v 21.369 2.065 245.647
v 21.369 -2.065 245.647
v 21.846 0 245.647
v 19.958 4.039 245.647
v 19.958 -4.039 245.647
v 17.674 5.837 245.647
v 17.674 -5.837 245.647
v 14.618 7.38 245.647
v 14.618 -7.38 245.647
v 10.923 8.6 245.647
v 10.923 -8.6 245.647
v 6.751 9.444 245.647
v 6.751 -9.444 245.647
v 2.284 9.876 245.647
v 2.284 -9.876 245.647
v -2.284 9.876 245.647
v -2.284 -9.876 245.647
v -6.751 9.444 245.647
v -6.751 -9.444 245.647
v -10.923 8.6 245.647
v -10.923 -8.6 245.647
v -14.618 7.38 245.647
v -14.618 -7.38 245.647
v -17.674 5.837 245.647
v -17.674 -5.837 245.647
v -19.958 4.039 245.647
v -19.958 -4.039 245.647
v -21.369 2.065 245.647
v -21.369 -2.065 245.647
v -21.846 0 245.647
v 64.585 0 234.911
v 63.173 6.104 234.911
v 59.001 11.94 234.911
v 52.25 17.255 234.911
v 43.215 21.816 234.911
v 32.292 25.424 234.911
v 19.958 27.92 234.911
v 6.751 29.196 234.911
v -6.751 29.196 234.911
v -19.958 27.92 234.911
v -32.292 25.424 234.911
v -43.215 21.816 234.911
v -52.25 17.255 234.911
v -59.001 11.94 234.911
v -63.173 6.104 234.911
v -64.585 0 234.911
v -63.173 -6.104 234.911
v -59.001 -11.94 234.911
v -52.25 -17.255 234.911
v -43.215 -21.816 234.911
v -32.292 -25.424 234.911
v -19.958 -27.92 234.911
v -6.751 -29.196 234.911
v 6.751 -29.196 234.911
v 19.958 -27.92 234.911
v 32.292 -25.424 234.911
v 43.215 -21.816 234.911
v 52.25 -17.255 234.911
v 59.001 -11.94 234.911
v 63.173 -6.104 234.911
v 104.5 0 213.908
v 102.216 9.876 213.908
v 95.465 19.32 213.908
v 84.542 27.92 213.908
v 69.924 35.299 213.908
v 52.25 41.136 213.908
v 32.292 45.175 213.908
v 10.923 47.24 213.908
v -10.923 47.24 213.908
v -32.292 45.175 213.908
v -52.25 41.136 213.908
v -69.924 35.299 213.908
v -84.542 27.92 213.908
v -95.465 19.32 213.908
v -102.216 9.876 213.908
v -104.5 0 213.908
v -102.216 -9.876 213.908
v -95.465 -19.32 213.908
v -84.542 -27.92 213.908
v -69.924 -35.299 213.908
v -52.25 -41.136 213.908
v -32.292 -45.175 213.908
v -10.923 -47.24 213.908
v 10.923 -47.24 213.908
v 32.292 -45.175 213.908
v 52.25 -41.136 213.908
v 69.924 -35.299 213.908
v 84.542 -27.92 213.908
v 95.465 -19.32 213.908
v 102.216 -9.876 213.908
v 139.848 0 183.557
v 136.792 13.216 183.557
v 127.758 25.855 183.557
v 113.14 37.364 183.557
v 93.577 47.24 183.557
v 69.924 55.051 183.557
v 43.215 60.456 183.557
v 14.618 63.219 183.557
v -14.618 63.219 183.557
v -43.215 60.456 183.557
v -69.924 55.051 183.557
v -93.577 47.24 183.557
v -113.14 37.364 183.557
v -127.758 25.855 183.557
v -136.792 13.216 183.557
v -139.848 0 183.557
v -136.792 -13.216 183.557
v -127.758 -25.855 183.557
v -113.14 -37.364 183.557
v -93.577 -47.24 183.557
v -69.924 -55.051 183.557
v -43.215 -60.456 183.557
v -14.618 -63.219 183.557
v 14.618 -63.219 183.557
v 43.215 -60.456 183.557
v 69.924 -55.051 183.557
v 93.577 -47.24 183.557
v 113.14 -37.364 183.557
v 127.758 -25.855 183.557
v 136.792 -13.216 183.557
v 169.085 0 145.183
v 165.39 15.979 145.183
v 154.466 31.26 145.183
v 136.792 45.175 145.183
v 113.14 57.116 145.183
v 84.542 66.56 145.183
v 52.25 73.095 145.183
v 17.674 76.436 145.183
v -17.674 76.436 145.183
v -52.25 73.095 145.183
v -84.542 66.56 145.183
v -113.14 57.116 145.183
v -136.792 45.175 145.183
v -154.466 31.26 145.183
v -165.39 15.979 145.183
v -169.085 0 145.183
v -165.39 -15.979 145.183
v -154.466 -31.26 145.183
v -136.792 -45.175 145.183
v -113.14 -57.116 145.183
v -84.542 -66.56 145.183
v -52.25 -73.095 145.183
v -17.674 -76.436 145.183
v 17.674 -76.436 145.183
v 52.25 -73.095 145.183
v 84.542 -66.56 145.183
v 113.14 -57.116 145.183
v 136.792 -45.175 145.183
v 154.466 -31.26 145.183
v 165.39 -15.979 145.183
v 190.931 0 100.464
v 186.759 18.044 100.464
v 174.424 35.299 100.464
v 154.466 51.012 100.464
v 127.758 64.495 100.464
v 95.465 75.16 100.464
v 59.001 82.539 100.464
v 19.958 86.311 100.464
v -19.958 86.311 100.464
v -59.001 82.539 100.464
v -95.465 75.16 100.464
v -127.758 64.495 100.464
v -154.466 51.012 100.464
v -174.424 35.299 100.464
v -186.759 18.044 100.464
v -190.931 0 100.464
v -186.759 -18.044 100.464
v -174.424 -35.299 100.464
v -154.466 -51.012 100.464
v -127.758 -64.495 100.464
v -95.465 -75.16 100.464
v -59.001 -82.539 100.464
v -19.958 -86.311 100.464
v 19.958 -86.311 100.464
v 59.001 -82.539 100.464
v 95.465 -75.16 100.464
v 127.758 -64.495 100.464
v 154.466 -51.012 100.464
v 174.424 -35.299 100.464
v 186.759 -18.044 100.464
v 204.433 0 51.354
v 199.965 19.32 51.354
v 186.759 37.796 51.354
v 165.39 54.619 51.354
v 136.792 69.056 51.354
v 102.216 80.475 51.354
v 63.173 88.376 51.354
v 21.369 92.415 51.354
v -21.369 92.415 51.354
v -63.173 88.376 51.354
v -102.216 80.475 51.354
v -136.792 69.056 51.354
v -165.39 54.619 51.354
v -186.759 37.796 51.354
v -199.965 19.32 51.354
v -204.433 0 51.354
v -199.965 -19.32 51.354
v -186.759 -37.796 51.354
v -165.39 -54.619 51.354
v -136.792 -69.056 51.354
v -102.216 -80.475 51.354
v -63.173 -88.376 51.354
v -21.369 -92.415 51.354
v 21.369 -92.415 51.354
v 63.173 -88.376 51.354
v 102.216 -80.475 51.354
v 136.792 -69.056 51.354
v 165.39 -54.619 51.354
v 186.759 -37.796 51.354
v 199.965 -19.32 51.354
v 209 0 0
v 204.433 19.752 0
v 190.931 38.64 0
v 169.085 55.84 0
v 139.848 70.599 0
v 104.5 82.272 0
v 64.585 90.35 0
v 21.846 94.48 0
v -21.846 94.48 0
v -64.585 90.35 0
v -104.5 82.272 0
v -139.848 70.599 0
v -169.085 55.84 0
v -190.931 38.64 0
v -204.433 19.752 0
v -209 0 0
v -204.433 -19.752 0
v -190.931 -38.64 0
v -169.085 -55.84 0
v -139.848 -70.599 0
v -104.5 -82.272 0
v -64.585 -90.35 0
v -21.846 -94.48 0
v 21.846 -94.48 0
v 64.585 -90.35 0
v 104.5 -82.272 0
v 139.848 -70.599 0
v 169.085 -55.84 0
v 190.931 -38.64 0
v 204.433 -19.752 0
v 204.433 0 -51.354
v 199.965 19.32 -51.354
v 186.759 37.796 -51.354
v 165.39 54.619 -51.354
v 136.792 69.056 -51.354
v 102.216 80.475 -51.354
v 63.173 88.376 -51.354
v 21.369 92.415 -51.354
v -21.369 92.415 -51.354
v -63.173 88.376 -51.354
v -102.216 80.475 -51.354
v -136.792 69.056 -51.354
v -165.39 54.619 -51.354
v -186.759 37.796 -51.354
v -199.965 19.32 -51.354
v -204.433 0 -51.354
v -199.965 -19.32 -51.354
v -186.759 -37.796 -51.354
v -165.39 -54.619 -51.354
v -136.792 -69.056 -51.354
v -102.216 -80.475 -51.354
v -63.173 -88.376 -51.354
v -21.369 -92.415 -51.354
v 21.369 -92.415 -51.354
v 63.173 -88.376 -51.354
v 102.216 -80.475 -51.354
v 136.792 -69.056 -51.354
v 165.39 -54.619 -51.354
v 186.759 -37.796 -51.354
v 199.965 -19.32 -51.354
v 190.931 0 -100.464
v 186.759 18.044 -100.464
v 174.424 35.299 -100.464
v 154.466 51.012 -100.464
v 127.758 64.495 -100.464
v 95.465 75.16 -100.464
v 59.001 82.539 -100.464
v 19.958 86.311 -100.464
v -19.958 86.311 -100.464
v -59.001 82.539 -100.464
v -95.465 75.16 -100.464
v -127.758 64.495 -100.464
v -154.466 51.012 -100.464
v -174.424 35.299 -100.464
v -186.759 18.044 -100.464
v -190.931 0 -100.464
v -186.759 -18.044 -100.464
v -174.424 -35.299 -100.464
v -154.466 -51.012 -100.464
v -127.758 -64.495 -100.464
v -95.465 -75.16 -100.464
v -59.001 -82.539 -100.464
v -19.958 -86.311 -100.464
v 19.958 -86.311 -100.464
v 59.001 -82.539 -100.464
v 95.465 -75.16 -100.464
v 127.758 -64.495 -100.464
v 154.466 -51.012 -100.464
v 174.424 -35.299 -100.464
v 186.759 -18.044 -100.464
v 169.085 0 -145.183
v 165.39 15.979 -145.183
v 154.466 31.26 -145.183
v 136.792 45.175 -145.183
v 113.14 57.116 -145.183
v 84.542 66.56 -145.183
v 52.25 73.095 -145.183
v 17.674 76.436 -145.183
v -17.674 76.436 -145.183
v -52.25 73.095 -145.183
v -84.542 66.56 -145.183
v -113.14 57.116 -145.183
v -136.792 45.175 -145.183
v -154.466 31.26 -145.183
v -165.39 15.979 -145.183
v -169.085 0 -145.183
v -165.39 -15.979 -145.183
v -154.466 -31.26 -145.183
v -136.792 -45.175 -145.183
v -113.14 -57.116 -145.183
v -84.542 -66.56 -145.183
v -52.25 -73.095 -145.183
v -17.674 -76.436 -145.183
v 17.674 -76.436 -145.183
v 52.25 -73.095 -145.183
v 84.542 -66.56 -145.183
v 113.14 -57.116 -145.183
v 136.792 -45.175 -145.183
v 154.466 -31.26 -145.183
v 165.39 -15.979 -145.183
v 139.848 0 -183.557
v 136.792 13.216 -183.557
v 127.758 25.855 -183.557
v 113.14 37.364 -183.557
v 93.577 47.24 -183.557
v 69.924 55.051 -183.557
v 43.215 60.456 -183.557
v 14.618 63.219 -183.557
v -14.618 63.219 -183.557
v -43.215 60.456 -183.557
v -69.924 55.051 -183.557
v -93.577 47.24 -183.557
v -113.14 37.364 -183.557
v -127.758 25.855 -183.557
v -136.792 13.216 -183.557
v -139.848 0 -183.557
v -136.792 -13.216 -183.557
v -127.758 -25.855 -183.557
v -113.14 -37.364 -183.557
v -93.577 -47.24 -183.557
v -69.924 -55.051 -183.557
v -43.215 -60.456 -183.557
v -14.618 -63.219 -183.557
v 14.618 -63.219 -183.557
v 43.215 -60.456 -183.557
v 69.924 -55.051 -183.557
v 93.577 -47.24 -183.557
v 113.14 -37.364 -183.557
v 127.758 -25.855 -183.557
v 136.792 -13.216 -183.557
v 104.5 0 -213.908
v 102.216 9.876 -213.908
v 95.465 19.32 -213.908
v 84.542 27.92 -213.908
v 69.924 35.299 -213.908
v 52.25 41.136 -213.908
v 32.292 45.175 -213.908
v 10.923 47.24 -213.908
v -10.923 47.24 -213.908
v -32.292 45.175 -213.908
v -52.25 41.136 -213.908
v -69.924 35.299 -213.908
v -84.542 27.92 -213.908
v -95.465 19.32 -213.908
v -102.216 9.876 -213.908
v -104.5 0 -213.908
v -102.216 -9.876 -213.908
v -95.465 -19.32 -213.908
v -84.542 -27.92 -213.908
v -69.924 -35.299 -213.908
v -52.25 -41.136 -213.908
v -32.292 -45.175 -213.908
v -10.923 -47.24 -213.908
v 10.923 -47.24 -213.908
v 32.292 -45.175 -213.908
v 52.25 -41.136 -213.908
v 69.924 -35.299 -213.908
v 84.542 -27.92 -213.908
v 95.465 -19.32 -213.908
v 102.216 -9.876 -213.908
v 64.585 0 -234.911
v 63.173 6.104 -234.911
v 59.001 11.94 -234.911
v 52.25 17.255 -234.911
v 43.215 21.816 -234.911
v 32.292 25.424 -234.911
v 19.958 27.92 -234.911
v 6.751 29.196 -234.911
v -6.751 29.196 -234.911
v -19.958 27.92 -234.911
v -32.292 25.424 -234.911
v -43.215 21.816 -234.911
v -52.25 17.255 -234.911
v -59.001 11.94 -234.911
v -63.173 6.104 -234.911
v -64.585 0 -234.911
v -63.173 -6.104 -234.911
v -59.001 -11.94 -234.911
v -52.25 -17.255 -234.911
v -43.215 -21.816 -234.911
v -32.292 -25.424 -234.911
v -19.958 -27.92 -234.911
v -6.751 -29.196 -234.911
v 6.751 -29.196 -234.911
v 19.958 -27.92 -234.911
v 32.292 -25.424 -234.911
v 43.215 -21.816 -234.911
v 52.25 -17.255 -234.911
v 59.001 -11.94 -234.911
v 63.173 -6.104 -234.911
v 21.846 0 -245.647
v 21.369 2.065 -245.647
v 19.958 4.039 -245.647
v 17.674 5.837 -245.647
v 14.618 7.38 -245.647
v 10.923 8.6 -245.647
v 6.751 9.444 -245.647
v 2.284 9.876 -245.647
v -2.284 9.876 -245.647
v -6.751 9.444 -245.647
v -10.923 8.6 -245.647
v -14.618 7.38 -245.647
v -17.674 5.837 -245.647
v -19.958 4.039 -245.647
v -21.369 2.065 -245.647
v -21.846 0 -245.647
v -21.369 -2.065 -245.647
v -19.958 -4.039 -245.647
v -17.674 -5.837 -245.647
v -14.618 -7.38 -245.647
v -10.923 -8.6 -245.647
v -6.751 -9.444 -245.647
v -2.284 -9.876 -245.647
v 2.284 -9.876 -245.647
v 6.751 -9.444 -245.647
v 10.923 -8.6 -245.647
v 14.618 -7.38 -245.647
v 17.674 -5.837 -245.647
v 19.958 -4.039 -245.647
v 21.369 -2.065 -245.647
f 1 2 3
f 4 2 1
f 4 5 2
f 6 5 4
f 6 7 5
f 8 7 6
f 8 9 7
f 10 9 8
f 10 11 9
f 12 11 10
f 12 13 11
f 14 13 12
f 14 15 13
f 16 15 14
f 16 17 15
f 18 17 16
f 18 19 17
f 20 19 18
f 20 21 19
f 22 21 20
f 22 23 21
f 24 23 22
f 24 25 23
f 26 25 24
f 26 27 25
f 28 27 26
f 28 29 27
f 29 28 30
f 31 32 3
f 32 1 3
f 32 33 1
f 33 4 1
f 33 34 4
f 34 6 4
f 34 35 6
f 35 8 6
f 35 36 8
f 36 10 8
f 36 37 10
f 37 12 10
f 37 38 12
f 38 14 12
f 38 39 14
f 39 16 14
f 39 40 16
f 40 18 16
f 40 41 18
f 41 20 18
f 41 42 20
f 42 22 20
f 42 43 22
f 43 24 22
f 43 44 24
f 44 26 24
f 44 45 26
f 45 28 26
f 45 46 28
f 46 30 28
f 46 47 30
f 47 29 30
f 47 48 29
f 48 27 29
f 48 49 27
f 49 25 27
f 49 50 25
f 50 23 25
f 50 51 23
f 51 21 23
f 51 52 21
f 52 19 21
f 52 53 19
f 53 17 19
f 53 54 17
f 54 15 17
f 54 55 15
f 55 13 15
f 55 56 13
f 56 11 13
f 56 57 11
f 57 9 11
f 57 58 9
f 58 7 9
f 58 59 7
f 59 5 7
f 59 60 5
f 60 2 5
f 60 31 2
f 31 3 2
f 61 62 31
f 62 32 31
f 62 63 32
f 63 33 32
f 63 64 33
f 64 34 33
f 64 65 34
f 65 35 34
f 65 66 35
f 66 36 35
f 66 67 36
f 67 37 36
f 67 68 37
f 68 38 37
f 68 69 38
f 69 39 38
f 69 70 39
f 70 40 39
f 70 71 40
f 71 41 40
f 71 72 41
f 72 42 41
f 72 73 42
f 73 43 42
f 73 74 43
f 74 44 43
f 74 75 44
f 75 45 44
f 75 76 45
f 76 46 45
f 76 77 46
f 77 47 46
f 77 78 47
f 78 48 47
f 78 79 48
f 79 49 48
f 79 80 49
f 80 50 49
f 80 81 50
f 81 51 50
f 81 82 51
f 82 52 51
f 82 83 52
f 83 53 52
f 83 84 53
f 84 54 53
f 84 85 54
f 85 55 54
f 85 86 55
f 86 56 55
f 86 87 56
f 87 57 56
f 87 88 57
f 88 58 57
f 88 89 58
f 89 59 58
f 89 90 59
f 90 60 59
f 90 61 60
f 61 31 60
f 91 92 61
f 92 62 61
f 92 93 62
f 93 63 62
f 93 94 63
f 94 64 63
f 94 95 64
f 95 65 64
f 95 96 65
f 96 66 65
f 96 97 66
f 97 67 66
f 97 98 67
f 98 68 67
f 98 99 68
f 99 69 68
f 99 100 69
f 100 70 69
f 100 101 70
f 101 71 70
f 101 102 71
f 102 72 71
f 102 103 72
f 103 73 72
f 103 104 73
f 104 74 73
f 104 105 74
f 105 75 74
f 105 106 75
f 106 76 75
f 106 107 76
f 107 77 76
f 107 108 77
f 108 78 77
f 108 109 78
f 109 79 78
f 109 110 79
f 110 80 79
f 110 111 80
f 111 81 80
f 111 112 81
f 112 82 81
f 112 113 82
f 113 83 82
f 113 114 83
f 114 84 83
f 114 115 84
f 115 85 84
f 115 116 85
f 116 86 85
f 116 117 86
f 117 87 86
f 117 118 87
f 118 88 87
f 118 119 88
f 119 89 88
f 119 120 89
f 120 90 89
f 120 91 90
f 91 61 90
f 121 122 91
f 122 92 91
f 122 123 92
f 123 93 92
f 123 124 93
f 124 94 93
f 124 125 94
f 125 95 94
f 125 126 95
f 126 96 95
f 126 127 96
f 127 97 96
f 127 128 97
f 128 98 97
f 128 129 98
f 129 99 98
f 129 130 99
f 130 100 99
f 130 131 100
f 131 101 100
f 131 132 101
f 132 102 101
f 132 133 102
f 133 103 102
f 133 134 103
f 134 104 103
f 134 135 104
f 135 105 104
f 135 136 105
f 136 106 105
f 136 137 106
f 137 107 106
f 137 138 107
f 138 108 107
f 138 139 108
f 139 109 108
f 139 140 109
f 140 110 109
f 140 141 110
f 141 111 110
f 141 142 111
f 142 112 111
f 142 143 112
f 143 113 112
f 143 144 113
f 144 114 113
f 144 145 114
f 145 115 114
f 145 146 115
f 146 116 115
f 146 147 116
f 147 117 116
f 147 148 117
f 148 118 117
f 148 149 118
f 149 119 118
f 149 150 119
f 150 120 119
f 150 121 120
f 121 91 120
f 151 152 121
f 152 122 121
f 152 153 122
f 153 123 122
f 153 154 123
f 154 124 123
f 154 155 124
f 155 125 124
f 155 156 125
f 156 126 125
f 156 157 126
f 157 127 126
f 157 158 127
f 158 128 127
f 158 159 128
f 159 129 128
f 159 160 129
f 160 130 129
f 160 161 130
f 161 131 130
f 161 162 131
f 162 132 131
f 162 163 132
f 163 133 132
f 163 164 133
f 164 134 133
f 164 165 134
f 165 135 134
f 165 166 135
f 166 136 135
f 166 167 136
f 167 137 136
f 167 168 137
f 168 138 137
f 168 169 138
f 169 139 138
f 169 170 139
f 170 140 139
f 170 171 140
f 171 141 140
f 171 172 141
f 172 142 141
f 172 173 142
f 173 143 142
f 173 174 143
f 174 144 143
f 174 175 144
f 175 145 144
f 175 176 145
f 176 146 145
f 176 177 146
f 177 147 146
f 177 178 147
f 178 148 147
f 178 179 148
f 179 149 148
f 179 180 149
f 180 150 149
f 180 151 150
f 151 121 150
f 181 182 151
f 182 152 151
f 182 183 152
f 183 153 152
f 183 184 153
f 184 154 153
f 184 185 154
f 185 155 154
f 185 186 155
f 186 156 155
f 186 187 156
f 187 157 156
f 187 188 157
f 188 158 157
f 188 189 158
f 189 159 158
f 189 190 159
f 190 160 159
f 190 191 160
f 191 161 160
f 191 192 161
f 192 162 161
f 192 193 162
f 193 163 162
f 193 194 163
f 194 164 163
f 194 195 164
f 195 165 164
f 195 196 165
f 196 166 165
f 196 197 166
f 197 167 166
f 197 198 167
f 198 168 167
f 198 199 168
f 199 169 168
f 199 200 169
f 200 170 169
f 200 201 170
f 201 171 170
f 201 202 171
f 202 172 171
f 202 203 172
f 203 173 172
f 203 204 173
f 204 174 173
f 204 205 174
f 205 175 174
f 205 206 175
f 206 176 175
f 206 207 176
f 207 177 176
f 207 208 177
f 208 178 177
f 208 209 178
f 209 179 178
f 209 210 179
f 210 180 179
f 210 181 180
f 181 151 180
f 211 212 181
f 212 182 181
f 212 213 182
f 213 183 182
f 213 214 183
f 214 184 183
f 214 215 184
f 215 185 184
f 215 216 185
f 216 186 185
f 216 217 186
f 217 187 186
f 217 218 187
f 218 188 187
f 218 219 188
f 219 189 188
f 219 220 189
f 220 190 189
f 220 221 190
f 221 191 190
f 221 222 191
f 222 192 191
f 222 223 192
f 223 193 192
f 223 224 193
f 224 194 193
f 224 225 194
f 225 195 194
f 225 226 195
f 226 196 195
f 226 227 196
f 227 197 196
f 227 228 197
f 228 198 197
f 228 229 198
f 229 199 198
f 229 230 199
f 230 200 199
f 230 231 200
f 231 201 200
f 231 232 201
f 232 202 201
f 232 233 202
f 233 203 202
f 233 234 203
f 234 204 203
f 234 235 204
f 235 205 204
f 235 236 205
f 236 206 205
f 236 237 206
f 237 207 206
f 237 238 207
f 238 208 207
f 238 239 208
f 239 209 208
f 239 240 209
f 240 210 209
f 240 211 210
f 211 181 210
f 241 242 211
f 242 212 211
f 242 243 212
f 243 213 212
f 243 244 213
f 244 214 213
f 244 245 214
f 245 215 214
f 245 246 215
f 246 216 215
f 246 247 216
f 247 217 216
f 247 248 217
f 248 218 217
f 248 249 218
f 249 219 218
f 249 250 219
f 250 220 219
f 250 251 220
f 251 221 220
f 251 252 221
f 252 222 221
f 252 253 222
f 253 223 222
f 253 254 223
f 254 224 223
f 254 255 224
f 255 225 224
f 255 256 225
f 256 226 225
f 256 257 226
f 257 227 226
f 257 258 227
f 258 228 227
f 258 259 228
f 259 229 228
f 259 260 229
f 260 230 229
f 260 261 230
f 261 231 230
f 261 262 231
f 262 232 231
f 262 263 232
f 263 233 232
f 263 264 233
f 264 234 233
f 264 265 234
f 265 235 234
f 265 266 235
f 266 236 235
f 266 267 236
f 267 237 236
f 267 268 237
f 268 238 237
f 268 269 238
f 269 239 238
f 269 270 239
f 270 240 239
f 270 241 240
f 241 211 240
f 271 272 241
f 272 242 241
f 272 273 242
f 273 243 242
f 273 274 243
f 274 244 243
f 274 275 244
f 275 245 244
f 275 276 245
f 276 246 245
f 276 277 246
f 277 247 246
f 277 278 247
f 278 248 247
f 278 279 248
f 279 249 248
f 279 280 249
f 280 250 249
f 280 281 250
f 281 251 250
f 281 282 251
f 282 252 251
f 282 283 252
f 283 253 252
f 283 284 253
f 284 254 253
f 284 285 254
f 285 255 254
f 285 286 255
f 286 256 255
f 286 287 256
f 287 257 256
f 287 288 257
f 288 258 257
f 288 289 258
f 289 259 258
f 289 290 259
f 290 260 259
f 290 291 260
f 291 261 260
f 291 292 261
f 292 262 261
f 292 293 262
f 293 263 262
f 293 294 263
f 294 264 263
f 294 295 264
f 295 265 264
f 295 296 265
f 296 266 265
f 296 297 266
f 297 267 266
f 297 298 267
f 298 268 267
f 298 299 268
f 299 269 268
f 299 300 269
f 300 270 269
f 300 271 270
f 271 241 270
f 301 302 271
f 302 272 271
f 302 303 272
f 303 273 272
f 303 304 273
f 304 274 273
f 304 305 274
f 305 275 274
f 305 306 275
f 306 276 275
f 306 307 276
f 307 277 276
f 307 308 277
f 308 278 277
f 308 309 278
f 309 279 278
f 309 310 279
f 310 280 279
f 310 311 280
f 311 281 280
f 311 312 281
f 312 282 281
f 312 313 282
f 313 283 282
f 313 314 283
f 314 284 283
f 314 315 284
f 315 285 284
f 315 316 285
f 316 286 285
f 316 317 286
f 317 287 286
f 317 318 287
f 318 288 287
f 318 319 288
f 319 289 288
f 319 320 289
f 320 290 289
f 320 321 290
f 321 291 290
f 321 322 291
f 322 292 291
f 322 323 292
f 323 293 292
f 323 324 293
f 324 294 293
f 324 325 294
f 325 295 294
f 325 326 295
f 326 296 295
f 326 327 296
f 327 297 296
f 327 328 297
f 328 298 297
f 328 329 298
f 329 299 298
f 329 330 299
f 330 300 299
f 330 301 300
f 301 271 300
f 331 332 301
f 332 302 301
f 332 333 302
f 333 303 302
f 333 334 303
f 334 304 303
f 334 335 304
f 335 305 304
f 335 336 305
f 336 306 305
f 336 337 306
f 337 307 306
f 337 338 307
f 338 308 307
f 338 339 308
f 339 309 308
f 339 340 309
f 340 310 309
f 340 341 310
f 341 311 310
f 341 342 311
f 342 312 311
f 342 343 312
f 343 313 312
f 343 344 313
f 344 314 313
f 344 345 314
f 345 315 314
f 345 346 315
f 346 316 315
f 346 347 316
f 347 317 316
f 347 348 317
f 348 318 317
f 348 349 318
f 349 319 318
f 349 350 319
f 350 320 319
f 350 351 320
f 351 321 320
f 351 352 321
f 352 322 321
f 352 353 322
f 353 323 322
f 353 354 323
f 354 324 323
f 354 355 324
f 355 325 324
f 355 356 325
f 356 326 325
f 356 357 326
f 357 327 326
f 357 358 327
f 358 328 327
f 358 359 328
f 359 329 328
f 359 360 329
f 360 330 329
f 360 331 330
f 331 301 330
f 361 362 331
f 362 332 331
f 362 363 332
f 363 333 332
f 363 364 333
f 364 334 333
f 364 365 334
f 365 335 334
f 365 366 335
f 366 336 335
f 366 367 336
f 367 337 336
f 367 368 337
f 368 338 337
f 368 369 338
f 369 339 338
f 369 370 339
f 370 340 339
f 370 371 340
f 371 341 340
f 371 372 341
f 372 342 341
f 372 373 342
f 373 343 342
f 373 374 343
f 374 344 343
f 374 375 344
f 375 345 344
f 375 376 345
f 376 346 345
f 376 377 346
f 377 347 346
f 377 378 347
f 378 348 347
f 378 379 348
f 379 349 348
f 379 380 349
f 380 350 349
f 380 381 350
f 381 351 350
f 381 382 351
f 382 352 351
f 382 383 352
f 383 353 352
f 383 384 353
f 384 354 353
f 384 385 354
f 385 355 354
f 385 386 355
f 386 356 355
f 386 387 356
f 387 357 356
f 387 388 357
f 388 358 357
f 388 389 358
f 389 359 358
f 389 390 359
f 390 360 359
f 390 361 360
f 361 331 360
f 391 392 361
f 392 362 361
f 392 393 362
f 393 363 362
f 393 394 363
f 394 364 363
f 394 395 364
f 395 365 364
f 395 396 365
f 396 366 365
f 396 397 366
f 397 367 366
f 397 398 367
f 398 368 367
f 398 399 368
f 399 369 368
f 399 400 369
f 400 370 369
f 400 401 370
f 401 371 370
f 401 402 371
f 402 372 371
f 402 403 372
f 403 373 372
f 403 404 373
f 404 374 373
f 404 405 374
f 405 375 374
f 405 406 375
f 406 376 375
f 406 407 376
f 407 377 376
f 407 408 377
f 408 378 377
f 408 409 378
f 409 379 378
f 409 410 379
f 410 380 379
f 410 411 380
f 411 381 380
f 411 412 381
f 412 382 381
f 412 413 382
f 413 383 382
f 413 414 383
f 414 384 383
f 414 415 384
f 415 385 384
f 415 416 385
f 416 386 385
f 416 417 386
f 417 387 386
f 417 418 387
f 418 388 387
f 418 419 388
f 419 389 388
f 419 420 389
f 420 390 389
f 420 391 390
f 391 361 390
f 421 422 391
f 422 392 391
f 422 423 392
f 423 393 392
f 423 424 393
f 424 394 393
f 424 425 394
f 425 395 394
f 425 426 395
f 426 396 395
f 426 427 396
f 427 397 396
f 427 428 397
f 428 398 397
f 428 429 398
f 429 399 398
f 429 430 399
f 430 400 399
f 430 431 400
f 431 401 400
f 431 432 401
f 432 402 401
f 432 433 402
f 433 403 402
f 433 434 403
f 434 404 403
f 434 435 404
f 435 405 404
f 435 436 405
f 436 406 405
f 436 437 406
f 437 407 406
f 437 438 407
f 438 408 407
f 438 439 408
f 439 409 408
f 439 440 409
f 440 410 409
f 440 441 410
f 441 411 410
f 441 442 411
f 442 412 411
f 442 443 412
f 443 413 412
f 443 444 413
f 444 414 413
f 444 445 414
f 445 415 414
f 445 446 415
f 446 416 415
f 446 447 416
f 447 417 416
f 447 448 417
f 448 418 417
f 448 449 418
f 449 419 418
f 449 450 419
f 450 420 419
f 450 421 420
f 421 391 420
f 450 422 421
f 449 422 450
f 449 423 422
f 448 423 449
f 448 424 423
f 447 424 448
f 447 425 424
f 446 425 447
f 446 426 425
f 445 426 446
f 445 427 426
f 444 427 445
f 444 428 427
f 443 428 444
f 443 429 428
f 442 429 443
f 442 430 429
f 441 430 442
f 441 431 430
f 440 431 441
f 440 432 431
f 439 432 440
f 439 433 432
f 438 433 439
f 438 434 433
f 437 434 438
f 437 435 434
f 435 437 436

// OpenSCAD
// Generated by SolidPython 1.0.1 on 2020-07-29 00:46:49


scale(v = [11, 5, 13]) {
	sphere(r = 19);
}
/***********************************************
*********      SolidPython code:      **********
************************************************
 
# import packages: SolidPython
from solid import *
from solid.utils import *
from itertools import chain, combinations, permutations


class Resize:

    def __init__(self, scad_file):
        self.scad_file = scad_file
        #self.scad_file = import_scad(scad_file)
        # cone/cylinder param:
        self.r1 = 0
        self.r2 = 0
        self.h = 0
        # rectangular prism param:
        self.w = 0
        self.l = 0
        # ellipse param:
        self.r = 0

    # import OpenScad code (file name corresponds to shape)


    # classify shape + parameters
    def assign(self, param1, param2, param3):
        if self.scad_file == 'cone.scad':
            self.r1 = param1
            self.r2 = param2
            self.h = param3
        elif self.scad_file == 'cylinder.scad':
            self.r1 = param1
            self.r2 = param2
            self.h = param3
        elif self.scad_file == 'rectangularPrism.scad':
            self.h = param1
            self.l = param2
            self.w = param3
        else:
            self.r = param1
            self.h = param2

    # resize parameters
    def iterate(self):
        x = range(3, 20, 2)
        i = 1
        if self.scad_file == 'cone.scad':
            tempList = list(permutations(x, 2))
            for temp in tempList:
                param1 = temp[0]
                param2 = temp[1]
                filepath = 'produced_scad_files/' + 'cone' + str(param1) + '_' + str(param2) + '_' + '.scad'
                scad_render_to_file(cylinder(h=param1, r1=param2, r2=0), filepath)

        elif self.scad_file == 'cylinder.scad':
            tempList = list(permutations(x, 3))
            for temp in tempList:
                param1 = temp[0]
                param2 = temp[1]
                filepath = 'produced_scad_files/' + 'cylinder' + str(param1) + '_' + str(param2) + '_' + '.scad'
                scad_render_to_file(cylinder(h=param1, r1=param2, r2=param2), filepath)

        elif self.scad_file == 'rectangularPrism.scad':
            tempList = list(permutations(x, 3))
            for temp in tempList:
                param1 = temp[0]
                param2 = temp[1]
                param3 = temp[2]
                filepath = 'produced_scad_files/' + 'rectangularPrism' + str(param1) + '_' + str(param2) + '_' + str(
                    param3) + '.scad'
                scad_render_to_file(cube(size=(param1, param2, param3)), filepath)

        elif self.scad_file == 'ellipse.scad':
            tempList = list(permutations(x, 4))
            for temp in tempList:
                param1 = temp[0]
                param2 = temp[1]
                param3 = temp[2]
                param4 = temp[3]
                filepath = 'produced_scad_files/' + 'ellipse' + str(param1) + '_' + str(param2) + '_' + str(param3) + '_' + str(param4) + '.scad'
                scad_render_to_file(scale([param1, param2, param3])(sphere(r=param4)), filepath)

    def render_to_scadfile(self):
        scad_render_to_file(scad, 'example.scad') 
 
************************************************/
